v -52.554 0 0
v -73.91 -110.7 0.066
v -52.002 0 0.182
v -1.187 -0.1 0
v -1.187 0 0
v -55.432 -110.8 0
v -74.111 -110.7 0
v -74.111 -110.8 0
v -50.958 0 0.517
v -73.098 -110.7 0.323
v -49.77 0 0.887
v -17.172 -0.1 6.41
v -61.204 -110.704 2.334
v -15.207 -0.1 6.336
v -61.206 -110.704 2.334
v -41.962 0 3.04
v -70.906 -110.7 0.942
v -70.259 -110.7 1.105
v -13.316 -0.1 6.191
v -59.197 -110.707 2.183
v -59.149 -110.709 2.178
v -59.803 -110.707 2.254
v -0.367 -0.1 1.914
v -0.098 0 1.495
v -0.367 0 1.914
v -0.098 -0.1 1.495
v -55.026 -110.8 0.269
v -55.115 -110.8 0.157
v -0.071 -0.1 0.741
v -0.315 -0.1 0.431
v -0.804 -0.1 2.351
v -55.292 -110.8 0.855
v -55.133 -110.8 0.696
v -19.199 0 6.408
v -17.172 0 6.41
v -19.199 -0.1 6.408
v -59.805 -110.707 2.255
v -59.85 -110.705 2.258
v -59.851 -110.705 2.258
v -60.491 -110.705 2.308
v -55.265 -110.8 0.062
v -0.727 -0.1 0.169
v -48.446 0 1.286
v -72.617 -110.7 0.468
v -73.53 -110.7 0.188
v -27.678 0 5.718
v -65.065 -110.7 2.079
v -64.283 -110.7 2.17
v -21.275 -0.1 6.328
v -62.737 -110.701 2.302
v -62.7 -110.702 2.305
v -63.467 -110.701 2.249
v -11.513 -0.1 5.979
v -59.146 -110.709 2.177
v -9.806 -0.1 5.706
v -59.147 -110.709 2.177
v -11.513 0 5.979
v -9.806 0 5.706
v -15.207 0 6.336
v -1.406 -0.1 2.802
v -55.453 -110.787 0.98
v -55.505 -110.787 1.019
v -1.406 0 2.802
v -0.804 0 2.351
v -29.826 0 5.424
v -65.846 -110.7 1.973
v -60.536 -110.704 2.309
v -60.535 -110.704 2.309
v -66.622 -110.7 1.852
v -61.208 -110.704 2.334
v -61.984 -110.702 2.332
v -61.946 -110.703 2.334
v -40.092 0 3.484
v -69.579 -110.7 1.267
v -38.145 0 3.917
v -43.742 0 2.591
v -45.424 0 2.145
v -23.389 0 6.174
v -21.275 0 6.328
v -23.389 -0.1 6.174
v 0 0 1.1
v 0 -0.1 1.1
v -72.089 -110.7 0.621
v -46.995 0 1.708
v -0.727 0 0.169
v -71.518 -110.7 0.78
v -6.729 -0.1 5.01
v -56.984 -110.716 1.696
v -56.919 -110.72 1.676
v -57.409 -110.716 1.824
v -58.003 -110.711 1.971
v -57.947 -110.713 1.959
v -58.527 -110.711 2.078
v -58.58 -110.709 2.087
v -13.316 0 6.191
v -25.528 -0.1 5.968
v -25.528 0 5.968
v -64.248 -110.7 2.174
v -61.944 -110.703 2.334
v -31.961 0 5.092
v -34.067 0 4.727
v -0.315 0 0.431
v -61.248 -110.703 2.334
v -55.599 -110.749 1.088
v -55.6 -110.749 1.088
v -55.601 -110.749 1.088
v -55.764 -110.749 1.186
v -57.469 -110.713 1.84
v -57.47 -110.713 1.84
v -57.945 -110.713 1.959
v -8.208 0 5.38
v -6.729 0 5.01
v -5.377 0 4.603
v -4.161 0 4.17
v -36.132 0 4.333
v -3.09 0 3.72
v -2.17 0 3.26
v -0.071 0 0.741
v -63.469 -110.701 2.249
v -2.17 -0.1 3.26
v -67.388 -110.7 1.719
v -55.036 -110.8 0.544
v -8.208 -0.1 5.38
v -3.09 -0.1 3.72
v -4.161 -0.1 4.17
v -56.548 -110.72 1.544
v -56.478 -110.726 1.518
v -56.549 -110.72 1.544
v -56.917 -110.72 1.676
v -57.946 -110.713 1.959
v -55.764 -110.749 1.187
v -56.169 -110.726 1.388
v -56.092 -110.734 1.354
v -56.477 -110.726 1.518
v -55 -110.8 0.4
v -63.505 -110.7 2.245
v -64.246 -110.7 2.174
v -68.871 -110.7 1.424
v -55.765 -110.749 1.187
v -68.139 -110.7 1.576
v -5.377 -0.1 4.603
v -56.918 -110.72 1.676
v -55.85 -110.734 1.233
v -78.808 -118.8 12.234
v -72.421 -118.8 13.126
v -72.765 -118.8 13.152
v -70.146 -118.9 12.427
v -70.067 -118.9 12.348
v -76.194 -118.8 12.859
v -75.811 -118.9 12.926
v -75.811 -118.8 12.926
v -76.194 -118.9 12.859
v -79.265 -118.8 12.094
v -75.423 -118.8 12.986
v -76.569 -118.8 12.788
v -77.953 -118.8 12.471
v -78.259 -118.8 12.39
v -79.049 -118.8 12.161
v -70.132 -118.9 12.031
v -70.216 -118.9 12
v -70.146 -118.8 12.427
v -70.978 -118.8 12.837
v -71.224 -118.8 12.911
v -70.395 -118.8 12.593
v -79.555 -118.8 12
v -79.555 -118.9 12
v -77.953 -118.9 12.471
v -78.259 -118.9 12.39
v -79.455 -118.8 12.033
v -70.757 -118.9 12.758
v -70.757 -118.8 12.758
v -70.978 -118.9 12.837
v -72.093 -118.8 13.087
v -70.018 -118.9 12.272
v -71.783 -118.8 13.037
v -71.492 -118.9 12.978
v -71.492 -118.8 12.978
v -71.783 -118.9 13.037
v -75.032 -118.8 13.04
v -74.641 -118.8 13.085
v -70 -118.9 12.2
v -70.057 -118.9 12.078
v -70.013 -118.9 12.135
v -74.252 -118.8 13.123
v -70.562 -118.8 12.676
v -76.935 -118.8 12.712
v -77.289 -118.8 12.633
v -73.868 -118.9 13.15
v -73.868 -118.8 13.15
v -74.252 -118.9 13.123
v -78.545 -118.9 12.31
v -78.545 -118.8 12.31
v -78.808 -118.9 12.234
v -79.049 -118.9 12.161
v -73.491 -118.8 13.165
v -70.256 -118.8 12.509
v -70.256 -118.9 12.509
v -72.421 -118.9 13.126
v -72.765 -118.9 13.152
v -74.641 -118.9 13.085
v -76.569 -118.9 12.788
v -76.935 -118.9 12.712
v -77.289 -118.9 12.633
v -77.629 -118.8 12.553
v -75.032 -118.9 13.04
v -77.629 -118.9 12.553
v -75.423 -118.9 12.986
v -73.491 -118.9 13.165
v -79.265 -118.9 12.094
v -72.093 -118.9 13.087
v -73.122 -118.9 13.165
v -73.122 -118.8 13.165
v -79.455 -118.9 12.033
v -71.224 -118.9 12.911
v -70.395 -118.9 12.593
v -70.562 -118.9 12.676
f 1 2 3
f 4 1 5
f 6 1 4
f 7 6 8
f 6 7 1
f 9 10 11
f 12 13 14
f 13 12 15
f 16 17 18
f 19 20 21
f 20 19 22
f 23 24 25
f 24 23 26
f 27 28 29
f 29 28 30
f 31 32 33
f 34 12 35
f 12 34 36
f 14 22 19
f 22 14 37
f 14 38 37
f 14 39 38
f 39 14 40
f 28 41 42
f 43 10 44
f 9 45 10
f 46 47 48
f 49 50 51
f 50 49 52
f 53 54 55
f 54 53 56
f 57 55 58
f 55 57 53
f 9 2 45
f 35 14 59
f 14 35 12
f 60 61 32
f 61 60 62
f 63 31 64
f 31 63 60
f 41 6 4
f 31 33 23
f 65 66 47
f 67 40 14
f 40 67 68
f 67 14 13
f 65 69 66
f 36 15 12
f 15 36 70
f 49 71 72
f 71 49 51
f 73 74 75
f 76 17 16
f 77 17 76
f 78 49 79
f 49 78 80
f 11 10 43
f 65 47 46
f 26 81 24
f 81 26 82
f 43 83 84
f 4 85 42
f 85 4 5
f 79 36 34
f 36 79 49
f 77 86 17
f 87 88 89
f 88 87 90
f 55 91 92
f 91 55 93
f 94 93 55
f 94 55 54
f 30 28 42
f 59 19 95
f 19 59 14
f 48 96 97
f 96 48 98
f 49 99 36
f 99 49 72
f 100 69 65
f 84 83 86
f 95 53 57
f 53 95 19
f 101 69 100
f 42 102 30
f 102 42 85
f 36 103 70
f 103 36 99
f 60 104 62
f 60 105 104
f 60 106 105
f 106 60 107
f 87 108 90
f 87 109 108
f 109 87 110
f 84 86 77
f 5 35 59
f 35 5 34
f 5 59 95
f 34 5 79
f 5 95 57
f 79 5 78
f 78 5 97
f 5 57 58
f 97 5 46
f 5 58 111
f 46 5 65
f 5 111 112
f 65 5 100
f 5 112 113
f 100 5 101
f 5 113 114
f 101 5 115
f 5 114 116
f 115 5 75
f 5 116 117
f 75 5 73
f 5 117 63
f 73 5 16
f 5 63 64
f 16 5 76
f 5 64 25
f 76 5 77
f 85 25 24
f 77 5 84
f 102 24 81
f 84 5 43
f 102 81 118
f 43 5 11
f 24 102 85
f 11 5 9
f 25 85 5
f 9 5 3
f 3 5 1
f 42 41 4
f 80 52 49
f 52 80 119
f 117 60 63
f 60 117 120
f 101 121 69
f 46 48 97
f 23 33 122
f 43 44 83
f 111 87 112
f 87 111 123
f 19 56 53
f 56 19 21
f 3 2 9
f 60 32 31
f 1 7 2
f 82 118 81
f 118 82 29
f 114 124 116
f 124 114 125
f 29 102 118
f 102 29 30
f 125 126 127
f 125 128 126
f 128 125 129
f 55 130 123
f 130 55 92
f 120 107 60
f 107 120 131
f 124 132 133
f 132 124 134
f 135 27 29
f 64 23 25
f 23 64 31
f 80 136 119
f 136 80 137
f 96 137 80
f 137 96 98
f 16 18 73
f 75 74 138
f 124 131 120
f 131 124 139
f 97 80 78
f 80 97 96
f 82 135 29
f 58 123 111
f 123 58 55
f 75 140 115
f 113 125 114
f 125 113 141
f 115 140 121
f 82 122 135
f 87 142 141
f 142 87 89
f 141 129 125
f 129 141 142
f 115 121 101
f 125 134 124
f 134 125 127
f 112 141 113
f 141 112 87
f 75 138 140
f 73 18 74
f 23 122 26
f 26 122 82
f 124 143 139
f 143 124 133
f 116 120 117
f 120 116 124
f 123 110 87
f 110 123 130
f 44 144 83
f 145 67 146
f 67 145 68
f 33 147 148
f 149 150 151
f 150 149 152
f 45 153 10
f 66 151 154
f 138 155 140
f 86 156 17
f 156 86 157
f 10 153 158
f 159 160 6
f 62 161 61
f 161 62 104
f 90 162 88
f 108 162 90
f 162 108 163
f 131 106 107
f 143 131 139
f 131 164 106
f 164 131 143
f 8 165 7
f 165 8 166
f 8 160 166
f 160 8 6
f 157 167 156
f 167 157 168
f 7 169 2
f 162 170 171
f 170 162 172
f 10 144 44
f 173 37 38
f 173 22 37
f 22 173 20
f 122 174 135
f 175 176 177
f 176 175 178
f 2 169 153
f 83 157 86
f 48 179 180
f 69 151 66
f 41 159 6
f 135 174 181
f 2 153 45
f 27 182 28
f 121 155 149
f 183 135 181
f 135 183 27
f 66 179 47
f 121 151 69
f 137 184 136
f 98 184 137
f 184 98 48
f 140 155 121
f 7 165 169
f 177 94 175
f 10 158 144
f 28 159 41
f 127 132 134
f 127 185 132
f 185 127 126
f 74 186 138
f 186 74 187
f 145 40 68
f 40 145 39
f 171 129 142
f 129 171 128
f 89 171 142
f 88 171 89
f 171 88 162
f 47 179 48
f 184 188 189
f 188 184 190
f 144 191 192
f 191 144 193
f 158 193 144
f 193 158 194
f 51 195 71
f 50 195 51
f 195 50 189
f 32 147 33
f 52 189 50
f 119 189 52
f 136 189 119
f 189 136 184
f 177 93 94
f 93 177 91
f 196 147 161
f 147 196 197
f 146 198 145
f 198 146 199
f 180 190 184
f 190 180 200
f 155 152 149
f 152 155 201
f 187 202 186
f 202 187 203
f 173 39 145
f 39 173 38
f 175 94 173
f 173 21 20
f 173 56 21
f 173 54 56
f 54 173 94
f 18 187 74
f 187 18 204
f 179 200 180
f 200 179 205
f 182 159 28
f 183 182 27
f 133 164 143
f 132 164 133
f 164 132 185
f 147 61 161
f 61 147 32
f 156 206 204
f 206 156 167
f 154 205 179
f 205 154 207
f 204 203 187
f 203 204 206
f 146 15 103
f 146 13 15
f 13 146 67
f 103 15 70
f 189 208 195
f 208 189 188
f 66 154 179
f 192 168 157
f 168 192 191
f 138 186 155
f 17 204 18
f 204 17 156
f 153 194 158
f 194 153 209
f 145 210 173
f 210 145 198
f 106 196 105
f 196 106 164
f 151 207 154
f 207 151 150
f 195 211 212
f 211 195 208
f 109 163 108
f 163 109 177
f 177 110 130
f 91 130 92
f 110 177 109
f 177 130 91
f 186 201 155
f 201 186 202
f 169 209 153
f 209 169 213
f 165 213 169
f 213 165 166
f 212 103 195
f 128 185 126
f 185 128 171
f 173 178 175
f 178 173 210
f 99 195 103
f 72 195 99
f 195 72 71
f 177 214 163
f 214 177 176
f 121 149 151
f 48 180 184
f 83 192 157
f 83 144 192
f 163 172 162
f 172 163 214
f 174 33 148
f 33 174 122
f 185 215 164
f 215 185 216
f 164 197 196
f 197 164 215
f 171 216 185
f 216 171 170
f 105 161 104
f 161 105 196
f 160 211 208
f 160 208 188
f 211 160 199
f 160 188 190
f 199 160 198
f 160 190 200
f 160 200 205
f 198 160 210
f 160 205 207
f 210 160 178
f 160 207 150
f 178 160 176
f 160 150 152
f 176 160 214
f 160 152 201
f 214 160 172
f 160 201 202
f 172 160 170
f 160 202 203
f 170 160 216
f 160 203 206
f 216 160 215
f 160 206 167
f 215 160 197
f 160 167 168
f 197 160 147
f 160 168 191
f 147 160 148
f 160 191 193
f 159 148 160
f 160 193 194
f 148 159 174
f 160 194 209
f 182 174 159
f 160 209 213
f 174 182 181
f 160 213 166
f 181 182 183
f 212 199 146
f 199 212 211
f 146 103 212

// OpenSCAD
// file: motor.scad
/*
    Motor mounts for the OpenSCAD aeroplane

    Copyright (C) Tim Molteno, tim@molteno.net

    
    This program is free software: you can redistribute it and/or modify
    it under the terms of the GNU General Public License as published by
    the Free Software Foundation, either version 3 of the License, or
    (at your option) any later version.

    This program is distributed in the hope that it will be useful,
    but WITHOUT ANY WARRANTY; without even the implied warranty of
    MERCHANTABILITY or FITNESS FOR A PARTICULAR PURPOSE.  See the
    GNU General Public License for more details.

    You should have received a copy of the GNU General Public License
    along with this program.  If not, see <http://www.gnu.org/licenses/>.
*/

module motor_mount() {
  difference() {
    union() {
      cylinder(r=6.5, h=10);
      translate([0,0,0.75]) cube([26,7 ,1.5], center=true);
      translate([0,0,0.75]) cube([7, 26,1.5], center=true);
    }
    cylinder(r=4, h=12, center=true);
    for (angle = [0,90,180,270]) {
      rotate(angle) translate([10,0,0]) cylinder(r=1.5, h=5, center=true);
    }
  }
}

/* Turnigy 2730-1500 */
module motor() {
  rotate([0,90,0]) {
    motor_mount();
    color("silver") cylinder(r=1.5, h=42); // shaft
    color("gold") translate([0,0,3]) cylinder(r=4, h=15); // housing
    color("red") translate([0,0,18]) cylinder(r=13.5, h=10); // outrunner
    translate([0,0,28]) cylinder(r=4, h=4.5); // forward housing
  }
}


/* Turnigy nano-tech 300mAH 2S 35-70C */
module battery() {
  cube([46, 18,12.5], center=true);
}


/* Servo. Turnigy TG9e */

module servo() {
  rotate([0,0,90]) {
    translate([-6, -11.5,0]) cube([12, 23, 23]);
    translate([-6,-16.25,16.5]) cube([12, 32.5, 2]);
    translate([0,0,23]) cylinder(r=6, h=4);
    translate([0,0,27]) cylinder(r=2.5, h=2.5);
  }
}

module servo_arm() {
  cylinder(r=3.5, h=4);
  translate([0,0,2.5]) hull() {
    cylinder(r=3.5, h=1.5);
    translate([14,0,0]) cylinder(r=2, h=1.5);
  }
}

motor();
// file: glider.scad
/*
    Openscad Aeroplane.

    Copyright (C) 2014 Tim Molteno, tim@molteno.net

    
    This program is free software: you can redistribute it and/or modify
    it under the terms of the GNU General Public License as published by
    the Free Software Foundation, either version 3 of the License, or
    (at your option) any later version.

    This program is distributed in the hope that it will be useful,
    but WITHOUT ANY WARRANTY; without even the implied warranty of
    MERCHANTABILITY or FITNESS FOR A PARTICULAR PURPOSE.  See the
    GNU General Public License for more details.

    You should have received a copy of the GNU General Public License
    along with this program.  If not, see <http://www.gnu.org/licenses/>.
*/

/* NACA 5412 Airfoil M=5.0% P=40.0% T=12.0% */

module airfoil(s) {
rotate([0,0,2]) scale([s,s,s]) mirror([1,0])  polygon(points=[
 [1.000000,-0.000000], [0.998459, 0.000480], [0.993844, 0.001912], [0.986185, 0.004266],
 [0.975528, 0.007497], [0.961940, 0.011541], [0.945503, 0.016321], [0.926320, 0.021747],
 [0.904508, 0.027720], [0.880203, 0.034131], [0.853553, 0.040868], [0.824724, 0.047815],
 [0.793893, 0.054856], [0.761249, 0.061875], [0.726995, 0.068760], [0.691342, 0.075399],
 [0.654508, 0.081690], [0.616723, 0.087531], [0.578217, 0.092831], [0.539230, 0.097504],
 [0.500000, 0.101473], [0.460770, 0.104671], [0.421783, 0.107042], [0.383277, 0.108495],
 [0.345492, 0.108628], [0.308658, 0.107381], [0.273005, 0.104801], [0.238751, 0.100962],
 [0.206107, 0.095964], [0.175276, 0.089926], [0.146447, 0.082992], [0.119797, 0.075318],
 [0.095492, 0.067072], [0.073680, 0.058429], [0.054497, 0.049563], [0.038060, 0.040642],
 [0.024472, 0.031824], [0.013815, 0.023248], [0.006156, 0.015030], [0.001541, 0.007261],
 [0.000000, 0.000000], [0.001541,-0.006492], [0.006156,-0.011976], [0.013815,-0.016460],
 [0.024472,-0.019963], [0.038060,-0.022517], [0.054497,-0.024170], [0.073680,-0.024982],
 [0.095492,-0.025026], [0.119797,-0.024389], [0.146447,-0.023173], [0.175276,-0.021490],
 [0.206107,-0.019460], [0.238751,-0.017213], [0.273005,-0.014881], [0.308658,-0.012596],
 [0.345492,-0.010485], [0.383277,-0.008670], [0.421783,-0.007174], [0.460770,-0.005697],
 [0.500000,-0.004250], [0.539230,-0.002888], [0.578217,-0.001653], [0.616723,-0.000578],
 [0.654508, 0.000317], [0.691342, 0.001023], [0.726995, 0.001539], [0.761249, 0.001875],
 [0.793893, 0.002047], [0.824724, 0.002077], [0.853553, 0.001991], [0.880203, 0.001815],
 [0.904508, 0.001578], [0.926320, 0.001305], [0.945503, 0.001019], [0.961940, 0.000743],
 [0.975528, 0.000494], [0.986185, 0.000286], [0.993844, 0.000130], [0.998459, 0.000033],
 [1.000000, 0.000000]]);
}

/* This is a foil with a flat bottom for easy printing */
module flat_foil(s) {
  difference() {
    translate([0,0.02*s, 0]) linear_extrude(height=0.1) airfoil(s);
    translate([-s, -s-5, -1]) cube([s+5,s+5,2]);
  }
}
	
wingspan = 135;
tail_length = 95;
nose_length = 40;

wing_x = 25;
wing_chord = 55;
wing_z = -10;

servo_z = -5;

dihedral_angle = 15;

module wing_left() {
  rotate([90,0,0]) {
    hull() {
      translate([-55,0,0.82*wingspan]) flat_foil(20);
      flat_foil(wing_chord);
    }
    hull() {
      translate([-55,0,0.82*wingspan]) flat_foil(20);
      translate([-70,12,0.88*wingspan]) flat_foil(10);
    }
  }
}

module wing_center() {
  difference() {
    rotate([90,0,0]) hull() {
      translate([0,0,wingspan/2]) flat_foil(wing_chord);
      translate([0,0,-wingspan/2]) flat_foil(wing_chord);
    }
    translate([0, wingspan/2,0]) rotate([dihedral_angle,0,0]) wing_right();
    translate([0, -wingspan/2,0]) rotate([-dihedral_angle,0,0])  wing_left();
  }
}


module wing_right() {
  mirror([0,1,0]) wing_left();
}

module wings() {
    translate([wing_x,0,wing_z]) {
      wing_center();
      translate([0, wingspan/2,0]) rotate([dihedral_angle,0,0]) wing_right();
      translate([0, -wingspan/2,0]) rotate([-dihedral_angle,0,0])  wing_left();
    }
}




/** FUSELAGE **/

use <motor.scad>;

module firewall() {
   rotate([0,90,0]) difference() {
	cylinder(r=13.5, h=5, $fn=21);
    for (angle = [0,90,180,270]) {
      rotate(angle) translate([10,0,0]) cylinder(r=1.5, h=12, center=true);
    }
  }
}

module fuselage_plain() {
    %translate([nose_length+5,0,0]) motor();
    translate([nose_length,0,0]) firewall();
    hull() {
      translate([nose_length-5,0,0]) firewall();
      sphere(r=20, $fn=21);
      translate([-tail_length-20,0,2]) sphere(r=5, $fn=21);
    }
}

module fuselage() {
  difference() {
    fuselage_plain();
    wings();
    translate([-tail_length,0,0]) stabilizers();
    #translate([0,0,10]) battery();
    #translate([-70,0,servo_z]) servo();
    #translate([-35,0,servo_z]) servo();
  }
}



/** STABILIZERS **/

module stabilizer_right() {
  hull() {
    translate([-20,0,0]) cube([20,2,1.5]);
    translate([-12, 40, 0]) cylinder(r=6, h=0.6);
  }
}

module stabilizer_left() {
  mirror([0,1,0]) stabilizer_right();
}


module rudder() {
  cube([25,1,38]);
}


module stabilizer_vert() {
  translate([-20,0,0])
  hull() {
    translate([0, -1, 1]) cube([20,2,1]);
    translate([4, 0, 40]) rotate([90,0,0]) cylinder(r=4, h=0.8);
  }
}

module stabilizers() {
    stabilizer_right();
    stabilizer_left();
    stabilizer_vert();
    translate([-46,0,5]) rudder();
}


/* This is the whole plane, as assembled. To print, you
   must generate a separate .stl for each of these parts
*/
module plane() {
  union() {
    fuselage();
    wings();
    translate([10,0,40]) wings();
    translate([-tail_length,0,0]) stabilizers();
  }
}

plane();
// main file
/*
	Openscad glider.

    The left wing tip

    Copyright (C) 2014 Tim Molteno, tim@molteno.net

    
    This program is free software: you can redistribute it and/or modify
    it under the terms of the GNU General Public License as published by
    the Free Software Foundation, either version 3 of the License, or
    (at your option) any later version.

    This program is distributed in the hope that it will be useful,
    but WITHOUT ANY WARRANTY; without even the implied warranty of
    MERCHANTABILITY or FITNESS FOR A PARTICULAR PURPOSE.  See the
    GNU General Public License for more details.

    You should have received a copy of the GNU General Public License
    along with this program.  If not, see <http://www.gnu.org/licenses/>.
*/
use <glider.scad>;

wing_left();
